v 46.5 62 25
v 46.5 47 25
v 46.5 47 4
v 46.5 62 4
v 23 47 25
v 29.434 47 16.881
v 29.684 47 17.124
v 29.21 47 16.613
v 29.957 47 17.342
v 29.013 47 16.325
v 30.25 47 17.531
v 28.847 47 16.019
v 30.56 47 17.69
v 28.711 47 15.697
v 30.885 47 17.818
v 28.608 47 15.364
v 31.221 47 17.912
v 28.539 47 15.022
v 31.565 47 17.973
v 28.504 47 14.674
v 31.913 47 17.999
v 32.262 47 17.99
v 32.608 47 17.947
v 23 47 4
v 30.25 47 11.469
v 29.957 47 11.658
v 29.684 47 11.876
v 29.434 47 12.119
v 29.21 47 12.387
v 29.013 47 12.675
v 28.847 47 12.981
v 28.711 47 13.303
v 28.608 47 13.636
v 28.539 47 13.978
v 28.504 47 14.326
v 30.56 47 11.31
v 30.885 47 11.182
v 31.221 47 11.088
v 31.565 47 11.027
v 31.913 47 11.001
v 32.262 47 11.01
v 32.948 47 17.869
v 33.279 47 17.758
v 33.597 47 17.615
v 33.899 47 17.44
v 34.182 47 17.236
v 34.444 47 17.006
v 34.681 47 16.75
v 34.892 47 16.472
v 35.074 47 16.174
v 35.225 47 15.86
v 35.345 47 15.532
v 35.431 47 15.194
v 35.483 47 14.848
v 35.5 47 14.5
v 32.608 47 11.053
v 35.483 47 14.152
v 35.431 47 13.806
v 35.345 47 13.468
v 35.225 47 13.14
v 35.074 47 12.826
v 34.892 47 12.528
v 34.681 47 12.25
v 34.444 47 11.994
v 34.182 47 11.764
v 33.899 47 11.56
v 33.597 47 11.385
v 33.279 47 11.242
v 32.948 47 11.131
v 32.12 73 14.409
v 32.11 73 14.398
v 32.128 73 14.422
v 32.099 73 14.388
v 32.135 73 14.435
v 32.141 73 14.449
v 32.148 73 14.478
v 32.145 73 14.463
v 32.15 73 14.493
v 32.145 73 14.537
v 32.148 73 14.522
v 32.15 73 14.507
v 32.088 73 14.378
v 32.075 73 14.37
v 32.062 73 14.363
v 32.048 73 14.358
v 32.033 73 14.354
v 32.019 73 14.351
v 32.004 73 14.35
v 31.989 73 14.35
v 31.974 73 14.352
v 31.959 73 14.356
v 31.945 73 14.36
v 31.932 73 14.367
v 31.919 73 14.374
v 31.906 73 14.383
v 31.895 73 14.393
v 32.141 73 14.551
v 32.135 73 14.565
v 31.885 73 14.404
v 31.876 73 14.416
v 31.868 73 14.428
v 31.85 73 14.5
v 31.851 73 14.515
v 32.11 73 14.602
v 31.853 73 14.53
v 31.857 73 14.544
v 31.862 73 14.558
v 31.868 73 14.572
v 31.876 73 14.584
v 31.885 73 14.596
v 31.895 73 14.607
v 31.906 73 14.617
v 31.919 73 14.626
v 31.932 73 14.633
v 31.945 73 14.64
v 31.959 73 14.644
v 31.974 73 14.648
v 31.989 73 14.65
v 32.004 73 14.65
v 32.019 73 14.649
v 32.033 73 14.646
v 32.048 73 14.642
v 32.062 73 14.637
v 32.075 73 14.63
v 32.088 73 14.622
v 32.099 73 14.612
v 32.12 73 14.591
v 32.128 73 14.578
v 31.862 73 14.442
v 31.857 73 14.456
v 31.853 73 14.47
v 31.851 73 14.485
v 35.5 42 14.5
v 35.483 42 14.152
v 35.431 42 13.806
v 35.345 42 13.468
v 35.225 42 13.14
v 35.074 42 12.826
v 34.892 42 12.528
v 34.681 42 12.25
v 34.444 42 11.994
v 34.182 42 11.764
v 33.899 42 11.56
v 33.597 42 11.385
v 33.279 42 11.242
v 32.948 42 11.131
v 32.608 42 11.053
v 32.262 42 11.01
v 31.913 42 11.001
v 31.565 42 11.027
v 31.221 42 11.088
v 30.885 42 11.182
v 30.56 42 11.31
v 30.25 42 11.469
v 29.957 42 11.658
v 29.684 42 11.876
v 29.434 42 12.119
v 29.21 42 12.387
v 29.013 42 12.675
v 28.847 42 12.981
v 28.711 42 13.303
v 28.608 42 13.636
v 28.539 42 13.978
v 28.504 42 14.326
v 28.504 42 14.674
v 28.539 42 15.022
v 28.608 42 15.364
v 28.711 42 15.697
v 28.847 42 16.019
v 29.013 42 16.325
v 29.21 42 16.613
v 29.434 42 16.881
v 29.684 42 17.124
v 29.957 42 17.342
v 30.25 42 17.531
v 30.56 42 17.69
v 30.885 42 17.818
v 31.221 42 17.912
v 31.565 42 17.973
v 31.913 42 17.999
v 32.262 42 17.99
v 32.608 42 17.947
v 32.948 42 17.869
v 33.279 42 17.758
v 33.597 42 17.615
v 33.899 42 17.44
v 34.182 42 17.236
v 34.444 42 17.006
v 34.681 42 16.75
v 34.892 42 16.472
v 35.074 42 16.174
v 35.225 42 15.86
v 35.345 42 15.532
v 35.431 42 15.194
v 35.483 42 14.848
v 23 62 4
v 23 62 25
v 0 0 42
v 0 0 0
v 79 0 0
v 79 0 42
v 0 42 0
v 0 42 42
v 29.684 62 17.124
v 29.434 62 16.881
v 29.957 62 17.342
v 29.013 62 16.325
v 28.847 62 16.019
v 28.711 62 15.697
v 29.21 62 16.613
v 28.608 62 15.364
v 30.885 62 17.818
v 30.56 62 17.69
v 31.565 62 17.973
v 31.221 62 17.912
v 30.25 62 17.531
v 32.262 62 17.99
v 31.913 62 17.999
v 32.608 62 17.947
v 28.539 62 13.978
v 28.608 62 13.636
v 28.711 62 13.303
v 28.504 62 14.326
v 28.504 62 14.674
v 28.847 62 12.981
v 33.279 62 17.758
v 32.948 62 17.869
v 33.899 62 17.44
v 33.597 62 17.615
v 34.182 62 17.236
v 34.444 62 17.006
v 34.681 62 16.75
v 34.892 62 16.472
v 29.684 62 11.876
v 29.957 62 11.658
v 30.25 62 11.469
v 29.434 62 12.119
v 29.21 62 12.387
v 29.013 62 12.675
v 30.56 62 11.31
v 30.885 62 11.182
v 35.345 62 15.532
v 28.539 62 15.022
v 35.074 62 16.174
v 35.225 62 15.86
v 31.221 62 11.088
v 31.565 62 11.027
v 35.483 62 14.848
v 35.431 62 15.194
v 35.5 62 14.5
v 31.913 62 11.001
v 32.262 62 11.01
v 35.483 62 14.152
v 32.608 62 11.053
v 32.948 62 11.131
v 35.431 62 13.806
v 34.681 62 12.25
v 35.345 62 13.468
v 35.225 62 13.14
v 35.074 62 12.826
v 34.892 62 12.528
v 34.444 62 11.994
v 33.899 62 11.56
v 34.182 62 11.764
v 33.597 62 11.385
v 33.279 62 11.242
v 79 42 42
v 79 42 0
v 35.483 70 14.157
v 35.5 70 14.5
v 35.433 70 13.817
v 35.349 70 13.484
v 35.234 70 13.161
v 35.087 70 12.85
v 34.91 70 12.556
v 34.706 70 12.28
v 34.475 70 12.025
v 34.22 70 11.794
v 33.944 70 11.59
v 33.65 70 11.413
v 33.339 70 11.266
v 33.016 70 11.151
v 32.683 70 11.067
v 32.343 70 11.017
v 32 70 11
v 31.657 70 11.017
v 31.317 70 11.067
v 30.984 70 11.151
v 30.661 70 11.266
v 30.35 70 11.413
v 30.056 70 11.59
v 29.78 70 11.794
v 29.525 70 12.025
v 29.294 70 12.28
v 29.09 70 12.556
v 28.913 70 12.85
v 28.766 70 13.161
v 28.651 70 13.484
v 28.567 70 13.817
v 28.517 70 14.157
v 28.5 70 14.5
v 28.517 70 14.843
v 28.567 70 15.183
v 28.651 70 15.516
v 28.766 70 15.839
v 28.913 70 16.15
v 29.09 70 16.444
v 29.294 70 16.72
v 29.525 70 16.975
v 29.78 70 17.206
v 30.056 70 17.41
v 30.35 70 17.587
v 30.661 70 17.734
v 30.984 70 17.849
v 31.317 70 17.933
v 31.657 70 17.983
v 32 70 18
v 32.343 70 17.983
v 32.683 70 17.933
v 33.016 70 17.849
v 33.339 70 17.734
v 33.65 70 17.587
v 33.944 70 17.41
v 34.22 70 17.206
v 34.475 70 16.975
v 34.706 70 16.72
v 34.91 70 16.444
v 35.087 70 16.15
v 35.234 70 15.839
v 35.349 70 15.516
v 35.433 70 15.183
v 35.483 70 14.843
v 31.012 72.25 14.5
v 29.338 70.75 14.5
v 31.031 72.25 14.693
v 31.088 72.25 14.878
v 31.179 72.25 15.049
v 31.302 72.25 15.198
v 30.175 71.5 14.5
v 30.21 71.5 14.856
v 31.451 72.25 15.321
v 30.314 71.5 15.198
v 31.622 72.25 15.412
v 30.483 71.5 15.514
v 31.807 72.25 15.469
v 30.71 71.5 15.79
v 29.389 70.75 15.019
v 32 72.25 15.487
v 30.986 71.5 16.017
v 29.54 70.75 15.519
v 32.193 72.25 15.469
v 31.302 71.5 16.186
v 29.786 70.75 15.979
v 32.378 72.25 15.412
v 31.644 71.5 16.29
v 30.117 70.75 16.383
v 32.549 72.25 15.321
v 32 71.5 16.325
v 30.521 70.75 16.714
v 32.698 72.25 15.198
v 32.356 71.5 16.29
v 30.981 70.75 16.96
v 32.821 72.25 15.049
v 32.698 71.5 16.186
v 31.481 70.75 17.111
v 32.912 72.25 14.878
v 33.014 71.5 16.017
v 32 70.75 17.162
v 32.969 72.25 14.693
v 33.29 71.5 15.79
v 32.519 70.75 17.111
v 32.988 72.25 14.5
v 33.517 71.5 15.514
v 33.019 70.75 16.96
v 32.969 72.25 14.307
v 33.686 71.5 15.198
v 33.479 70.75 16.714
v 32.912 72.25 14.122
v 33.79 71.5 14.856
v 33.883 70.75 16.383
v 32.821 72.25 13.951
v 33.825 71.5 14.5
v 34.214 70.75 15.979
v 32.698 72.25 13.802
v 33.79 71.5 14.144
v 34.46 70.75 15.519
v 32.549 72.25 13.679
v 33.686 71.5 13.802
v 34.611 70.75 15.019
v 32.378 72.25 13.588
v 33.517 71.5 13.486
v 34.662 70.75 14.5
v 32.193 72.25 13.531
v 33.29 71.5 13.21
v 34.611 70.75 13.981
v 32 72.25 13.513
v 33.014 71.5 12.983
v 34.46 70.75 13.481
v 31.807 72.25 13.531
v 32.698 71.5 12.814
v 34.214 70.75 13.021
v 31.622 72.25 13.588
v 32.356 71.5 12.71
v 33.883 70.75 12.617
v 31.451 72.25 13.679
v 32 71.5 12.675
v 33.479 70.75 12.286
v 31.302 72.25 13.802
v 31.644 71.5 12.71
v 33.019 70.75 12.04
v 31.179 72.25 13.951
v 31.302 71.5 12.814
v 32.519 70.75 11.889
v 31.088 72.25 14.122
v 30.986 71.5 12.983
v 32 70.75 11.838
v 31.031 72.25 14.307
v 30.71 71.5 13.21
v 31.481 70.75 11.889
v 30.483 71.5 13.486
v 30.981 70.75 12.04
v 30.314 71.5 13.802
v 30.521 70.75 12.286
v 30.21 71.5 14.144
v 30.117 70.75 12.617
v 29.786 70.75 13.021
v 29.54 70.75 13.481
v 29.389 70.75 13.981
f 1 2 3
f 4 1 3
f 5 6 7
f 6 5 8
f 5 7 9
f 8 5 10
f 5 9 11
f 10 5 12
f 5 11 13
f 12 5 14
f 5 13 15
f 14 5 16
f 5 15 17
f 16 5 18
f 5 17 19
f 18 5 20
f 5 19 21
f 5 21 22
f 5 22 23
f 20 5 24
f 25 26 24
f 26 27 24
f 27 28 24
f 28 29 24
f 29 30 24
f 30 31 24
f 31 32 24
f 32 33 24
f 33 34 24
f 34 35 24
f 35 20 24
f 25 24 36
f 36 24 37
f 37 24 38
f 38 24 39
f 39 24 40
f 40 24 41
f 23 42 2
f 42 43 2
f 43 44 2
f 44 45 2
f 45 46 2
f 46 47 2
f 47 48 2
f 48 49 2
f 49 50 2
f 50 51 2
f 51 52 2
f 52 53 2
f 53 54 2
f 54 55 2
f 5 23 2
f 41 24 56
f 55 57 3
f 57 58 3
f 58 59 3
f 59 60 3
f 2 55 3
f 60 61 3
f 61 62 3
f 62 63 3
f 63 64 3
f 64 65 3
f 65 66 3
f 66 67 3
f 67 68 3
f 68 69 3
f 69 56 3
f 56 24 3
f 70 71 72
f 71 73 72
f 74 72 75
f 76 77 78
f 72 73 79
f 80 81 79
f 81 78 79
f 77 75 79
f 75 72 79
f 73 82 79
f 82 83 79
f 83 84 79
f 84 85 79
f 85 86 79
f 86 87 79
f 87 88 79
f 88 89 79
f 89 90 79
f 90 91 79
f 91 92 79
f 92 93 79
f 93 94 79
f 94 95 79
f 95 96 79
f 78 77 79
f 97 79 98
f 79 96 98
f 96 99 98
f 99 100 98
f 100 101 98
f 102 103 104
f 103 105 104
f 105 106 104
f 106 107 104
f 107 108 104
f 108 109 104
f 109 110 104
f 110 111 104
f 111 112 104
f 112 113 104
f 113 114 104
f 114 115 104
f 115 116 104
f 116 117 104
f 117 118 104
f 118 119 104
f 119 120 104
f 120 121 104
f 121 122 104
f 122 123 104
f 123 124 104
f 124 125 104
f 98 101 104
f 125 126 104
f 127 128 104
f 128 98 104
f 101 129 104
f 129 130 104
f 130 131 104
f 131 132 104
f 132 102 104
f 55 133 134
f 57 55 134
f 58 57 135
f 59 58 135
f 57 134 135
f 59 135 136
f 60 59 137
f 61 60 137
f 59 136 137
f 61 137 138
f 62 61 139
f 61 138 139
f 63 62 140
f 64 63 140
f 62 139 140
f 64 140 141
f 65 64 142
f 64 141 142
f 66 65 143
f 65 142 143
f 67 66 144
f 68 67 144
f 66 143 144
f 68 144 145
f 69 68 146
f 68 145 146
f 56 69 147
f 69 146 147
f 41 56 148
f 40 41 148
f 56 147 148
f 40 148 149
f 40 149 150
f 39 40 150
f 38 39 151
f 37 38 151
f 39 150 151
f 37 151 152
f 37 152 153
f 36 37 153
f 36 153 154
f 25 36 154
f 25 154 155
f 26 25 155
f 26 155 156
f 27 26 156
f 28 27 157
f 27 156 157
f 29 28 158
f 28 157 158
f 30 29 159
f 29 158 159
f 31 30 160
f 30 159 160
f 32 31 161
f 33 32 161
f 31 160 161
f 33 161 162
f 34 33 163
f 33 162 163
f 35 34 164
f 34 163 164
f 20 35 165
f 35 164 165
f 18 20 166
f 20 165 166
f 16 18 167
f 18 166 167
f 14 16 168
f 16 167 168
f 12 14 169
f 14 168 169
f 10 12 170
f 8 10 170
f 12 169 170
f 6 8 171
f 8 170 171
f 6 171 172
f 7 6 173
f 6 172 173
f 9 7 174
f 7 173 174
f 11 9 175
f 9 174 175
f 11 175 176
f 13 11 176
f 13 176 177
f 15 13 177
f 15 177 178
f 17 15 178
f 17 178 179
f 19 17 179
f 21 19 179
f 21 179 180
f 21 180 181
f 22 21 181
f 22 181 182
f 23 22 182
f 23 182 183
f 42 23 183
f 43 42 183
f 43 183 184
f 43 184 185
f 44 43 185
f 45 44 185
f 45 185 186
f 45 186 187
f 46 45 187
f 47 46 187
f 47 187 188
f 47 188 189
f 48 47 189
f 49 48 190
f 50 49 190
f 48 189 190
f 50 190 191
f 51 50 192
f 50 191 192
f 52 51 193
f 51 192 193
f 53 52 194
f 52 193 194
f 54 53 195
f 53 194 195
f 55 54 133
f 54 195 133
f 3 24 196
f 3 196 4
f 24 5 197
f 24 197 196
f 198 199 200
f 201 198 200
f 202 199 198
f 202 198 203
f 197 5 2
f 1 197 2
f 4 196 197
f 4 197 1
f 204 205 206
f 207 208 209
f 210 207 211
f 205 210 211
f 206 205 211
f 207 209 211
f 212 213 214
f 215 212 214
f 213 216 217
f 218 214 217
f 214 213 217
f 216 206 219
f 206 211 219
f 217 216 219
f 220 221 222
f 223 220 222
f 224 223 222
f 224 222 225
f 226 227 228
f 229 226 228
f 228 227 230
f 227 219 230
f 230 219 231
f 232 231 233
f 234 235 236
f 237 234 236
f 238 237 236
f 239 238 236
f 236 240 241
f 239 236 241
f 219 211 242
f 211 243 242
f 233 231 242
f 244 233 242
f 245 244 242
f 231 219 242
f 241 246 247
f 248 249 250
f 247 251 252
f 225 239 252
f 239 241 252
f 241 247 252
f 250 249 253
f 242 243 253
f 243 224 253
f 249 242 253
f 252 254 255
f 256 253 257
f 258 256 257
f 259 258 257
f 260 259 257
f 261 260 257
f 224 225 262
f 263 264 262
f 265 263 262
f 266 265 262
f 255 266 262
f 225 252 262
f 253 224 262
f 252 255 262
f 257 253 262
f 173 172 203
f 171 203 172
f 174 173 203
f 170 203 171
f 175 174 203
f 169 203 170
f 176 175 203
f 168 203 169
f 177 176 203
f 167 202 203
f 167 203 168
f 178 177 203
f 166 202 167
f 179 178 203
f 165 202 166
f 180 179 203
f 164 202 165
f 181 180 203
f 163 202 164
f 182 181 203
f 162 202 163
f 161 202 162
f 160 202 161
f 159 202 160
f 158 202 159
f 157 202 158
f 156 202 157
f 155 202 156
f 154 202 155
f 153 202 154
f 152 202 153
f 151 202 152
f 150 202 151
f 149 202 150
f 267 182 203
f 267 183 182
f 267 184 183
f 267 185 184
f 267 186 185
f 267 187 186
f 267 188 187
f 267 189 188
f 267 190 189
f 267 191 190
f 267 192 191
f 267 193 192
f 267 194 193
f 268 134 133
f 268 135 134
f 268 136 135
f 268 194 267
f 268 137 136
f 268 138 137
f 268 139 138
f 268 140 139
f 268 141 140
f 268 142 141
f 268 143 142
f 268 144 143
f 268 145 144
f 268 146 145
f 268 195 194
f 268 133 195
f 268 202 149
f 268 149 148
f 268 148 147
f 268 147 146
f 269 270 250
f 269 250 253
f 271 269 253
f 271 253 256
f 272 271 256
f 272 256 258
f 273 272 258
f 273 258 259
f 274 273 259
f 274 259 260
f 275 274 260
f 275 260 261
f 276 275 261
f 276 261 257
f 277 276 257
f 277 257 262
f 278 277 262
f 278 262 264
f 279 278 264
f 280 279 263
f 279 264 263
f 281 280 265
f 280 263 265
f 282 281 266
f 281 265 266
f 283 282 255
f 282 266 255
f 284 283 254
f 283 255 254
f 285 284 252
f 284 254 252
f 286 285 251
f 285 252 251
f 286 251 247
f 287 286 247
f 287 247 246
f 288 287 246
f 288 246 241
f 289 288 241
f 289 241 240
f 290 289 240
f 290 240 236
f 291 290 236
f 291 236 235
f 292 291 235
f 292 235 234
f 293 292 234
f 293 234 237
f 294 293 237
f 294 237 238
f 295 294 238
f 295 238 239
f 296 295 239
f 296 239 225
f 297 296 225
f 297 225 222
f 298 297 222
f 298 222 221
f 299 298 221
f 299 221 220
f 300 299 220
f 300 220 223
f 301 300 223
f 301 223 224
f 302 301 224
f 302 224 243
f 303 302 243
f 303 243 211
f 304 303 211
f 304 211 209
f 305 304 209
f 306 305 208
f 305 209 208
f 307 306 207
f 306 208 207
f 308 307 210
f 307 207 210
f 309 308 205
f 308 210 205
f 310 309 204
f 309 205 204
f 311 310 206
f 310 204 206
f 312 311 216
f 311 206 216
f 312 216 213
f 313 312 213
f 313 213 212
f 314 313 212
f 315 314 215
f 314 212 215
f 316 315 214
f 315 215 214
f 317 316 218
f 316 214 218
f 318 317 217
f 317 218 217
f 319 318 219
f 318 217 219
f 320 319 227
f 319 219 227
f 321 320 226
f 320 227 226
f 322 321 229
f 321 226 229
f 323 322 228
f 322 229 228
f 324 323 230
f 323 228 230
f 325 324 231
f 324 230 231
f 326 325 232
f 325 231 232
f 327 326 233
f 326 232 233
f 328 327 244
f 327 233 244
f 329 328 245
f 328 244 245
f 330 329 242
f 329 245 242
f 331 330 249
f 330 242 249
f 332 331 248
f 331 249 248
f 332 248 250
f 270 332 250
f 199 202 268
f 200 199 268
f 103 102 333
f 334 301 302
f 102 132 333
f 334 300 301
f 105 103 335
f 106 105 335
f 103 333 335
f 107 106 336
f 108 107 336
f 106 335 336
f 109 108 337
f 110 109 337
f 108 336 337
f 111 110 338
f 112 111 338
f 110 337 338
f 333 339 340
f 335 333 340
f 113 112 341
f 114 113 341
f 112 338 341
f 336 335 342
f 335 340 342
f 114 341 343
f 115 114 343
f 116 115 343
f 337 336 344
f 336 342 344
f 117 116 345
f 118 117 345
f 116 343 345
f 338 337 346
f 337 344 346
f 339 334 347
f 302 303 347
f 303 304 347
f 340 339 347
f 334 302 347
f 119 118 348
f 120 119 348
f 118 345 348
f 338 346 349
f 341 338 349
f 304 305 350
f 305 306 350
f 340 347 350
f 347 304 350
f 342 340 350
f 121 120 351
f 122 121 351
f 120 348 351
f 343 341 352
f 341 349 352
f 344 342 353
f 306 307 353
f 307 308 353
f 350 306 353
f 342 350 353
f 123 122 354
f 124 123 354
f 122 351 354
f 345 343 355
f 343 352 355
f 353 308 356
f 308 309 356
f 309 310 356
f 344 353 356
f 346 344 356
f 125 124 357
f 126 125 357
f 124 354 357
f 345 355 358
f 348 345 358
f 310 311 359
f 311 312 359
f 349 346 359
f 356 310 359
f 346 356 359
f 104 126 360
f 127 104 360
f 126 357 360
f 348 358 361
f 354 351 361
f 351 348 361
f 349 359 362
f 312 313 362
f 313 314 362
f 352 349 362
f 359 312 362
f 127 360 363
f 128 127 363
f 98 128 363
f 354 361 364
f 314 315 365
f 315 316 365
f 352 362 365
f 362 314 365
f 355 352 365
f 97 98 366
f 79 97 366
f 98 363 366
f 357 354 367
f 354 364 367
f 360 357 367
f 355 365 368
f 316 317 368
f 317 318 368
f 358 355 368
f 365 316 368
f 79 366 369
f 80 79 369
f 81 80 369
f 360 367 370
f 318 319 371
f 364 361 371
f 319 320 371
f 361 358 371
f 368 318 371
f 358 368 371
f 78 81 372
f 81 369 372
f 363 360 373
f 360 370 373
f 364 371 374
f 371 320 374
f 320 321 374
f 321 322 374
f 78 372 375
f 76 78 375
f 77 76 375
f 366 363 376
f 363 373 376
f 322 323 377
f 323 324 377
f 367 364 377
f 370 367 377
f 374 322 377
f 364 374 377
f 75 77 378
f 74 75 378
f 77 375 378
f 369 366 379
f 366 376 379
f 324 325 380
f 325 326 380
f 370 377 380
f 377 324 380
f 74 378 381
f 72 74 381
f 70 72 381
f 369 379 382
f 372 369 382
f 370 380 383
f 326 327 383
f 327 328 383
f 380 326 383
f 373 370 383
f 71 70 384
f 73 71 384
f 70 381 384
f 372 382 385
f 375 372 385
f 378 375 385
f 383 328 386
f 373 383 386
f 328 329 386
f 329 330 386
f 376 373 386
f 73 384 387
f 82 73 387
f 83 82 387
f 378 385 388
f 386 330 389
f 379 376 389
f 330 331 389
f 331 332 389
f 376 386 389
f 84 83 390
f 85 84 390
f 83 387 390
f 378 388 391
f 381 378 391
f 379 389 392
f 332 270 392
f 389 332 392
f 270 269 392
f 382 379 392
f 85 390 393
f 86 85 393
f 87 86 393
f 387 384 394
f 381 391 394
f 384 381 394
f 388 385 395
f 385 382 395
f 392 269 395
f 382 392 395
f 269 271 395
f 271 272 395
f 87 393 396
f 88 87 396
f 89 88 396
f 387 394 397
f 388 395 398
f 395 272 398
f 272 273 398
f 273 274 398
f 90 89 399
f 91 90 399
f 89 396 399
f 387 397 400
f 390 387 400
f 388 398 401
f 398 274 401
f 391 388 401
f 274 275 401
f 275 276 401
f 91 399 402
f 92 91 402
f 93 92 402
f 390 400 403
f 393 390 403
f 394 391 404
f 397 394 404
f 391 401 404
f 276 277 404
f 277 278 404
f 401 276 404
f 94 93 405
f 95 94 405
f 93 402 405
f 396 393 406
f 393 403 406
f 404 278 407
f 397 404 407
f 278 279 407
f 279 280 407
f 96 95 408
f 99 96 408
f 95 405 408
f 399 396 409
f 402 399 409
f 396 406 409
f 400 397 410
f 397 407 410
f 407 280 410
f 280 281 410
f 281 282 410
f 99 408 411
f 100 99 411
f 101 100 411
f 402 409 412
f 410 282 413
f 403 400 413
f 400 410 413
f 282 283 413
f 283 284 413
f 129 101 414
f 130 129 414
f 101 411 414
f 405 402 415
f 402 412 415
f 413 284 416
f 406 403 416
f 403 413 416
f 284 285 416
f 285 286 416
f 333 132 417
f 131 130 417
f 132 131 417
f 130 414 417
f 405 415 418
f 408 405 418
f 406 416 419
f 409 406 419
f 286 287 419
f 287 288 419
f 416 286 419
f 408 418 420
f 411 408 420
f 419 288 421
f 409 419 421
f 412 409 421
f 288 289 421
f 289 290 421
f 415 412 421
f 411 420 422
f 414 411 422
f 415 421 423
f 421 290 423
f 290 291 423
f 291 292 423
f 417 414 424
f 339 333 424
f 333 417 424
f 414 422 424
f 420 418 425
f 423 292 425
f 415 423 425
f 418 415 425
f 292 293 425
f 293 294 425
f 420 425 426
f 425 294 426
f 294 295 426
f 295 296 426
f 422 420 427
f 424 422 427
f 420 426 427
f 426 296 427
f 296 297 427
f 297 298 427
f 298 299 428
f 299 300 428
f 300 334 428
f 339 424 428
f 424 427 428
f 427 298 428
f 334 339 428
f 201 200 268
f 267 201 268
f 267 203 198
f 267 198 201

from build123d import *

# Parameters (mm, degrees)
SKETCH1_W           = 79
SKETCH1_H           = 42
BOSS_EXTRUDE1_DEPTH = 42
BOSS_EXTRUDE2_START = 5
SKETCH3_W           = 23.5
SKETCH3_H           = 21
BOSS_EXTRUDE2_DEPTH = 15
SKETCH4_R           = 3.5
BOSS_EXTRUDE3_DEPTH = 8
SKETCH6_R           = 3.5
BOSS_EXTRUDE4_DEPTH = 5


with BuildPart() as part:
    # Sketch1 → Boss-Extrude1 (new body)
    with BuildSketch(Plane.XY):
        with Locations((39.5, 21)):
            Rectangle(SKETCH1_W, SKETCH1_H)
    extrude(amount=BOSS_EXTRUDE1_DEPTH)



with BuildPart() as body_2:
    # Sketch3 → Boss-Extrude2 (new body)
    with BuildSketch(Plane(origin=(0, 42, 0), x_dir=(1, 0, 0), z_dir=(0, 1, 0)).offset(BOSS_EXTRUDE2_START)):
        with Locations((34.75, -14.5)):
            Rectangle(SKETCH3_W, SKETCH3_H)
    extrude(amount=BOSS_EXTRUDE2_DEPTH)


with BuildPart() as body_3:
    # Sketch4 → Boss-Extrude3 (new body)
    with BuildSketch(Plane(origin=(0, 62, 0), x_dir=(1, 0, 0), z_dir=(0, 1, 0))):
        with Locations((32, -14.5)):
            Circle(SKETCH4_R)
    extrude(amount=BOSS_EXTRUDE3_DEPTH)

    # Sketch5 → Revolve1 (revolve)
    with BuildSketch(Plane(origin=(0, 0, 14.5), x_dir=(-1, 0, 0), z_dir=(0, 0, -1))):
        Polygon((-32, 70), (-32, 73), (-31.85, 73), (-28.5, 70), align=None)
    revolve(axis=Axis((32, 70, 14.5), (0, 1, 0)))


with BuildPart() as part_1:
    add(part.part)

    add(body_2.part)  # Boss-Extrude4 merges body 2
    # Sketch6 → Boss-Extrude4 (add)
    with BuildSketch(Plane(origin=(0, 42, 0), x_dir=(1, 0, 0), z_dir=(0, 1, 0))):
        with Locations((32, -14.5)):
            Circle(SKETCH6_R)
    extrude(amount=BOSS_EXTRUDE4_DEPTH)


solid = Compound([body_3.part, part_1.part])
